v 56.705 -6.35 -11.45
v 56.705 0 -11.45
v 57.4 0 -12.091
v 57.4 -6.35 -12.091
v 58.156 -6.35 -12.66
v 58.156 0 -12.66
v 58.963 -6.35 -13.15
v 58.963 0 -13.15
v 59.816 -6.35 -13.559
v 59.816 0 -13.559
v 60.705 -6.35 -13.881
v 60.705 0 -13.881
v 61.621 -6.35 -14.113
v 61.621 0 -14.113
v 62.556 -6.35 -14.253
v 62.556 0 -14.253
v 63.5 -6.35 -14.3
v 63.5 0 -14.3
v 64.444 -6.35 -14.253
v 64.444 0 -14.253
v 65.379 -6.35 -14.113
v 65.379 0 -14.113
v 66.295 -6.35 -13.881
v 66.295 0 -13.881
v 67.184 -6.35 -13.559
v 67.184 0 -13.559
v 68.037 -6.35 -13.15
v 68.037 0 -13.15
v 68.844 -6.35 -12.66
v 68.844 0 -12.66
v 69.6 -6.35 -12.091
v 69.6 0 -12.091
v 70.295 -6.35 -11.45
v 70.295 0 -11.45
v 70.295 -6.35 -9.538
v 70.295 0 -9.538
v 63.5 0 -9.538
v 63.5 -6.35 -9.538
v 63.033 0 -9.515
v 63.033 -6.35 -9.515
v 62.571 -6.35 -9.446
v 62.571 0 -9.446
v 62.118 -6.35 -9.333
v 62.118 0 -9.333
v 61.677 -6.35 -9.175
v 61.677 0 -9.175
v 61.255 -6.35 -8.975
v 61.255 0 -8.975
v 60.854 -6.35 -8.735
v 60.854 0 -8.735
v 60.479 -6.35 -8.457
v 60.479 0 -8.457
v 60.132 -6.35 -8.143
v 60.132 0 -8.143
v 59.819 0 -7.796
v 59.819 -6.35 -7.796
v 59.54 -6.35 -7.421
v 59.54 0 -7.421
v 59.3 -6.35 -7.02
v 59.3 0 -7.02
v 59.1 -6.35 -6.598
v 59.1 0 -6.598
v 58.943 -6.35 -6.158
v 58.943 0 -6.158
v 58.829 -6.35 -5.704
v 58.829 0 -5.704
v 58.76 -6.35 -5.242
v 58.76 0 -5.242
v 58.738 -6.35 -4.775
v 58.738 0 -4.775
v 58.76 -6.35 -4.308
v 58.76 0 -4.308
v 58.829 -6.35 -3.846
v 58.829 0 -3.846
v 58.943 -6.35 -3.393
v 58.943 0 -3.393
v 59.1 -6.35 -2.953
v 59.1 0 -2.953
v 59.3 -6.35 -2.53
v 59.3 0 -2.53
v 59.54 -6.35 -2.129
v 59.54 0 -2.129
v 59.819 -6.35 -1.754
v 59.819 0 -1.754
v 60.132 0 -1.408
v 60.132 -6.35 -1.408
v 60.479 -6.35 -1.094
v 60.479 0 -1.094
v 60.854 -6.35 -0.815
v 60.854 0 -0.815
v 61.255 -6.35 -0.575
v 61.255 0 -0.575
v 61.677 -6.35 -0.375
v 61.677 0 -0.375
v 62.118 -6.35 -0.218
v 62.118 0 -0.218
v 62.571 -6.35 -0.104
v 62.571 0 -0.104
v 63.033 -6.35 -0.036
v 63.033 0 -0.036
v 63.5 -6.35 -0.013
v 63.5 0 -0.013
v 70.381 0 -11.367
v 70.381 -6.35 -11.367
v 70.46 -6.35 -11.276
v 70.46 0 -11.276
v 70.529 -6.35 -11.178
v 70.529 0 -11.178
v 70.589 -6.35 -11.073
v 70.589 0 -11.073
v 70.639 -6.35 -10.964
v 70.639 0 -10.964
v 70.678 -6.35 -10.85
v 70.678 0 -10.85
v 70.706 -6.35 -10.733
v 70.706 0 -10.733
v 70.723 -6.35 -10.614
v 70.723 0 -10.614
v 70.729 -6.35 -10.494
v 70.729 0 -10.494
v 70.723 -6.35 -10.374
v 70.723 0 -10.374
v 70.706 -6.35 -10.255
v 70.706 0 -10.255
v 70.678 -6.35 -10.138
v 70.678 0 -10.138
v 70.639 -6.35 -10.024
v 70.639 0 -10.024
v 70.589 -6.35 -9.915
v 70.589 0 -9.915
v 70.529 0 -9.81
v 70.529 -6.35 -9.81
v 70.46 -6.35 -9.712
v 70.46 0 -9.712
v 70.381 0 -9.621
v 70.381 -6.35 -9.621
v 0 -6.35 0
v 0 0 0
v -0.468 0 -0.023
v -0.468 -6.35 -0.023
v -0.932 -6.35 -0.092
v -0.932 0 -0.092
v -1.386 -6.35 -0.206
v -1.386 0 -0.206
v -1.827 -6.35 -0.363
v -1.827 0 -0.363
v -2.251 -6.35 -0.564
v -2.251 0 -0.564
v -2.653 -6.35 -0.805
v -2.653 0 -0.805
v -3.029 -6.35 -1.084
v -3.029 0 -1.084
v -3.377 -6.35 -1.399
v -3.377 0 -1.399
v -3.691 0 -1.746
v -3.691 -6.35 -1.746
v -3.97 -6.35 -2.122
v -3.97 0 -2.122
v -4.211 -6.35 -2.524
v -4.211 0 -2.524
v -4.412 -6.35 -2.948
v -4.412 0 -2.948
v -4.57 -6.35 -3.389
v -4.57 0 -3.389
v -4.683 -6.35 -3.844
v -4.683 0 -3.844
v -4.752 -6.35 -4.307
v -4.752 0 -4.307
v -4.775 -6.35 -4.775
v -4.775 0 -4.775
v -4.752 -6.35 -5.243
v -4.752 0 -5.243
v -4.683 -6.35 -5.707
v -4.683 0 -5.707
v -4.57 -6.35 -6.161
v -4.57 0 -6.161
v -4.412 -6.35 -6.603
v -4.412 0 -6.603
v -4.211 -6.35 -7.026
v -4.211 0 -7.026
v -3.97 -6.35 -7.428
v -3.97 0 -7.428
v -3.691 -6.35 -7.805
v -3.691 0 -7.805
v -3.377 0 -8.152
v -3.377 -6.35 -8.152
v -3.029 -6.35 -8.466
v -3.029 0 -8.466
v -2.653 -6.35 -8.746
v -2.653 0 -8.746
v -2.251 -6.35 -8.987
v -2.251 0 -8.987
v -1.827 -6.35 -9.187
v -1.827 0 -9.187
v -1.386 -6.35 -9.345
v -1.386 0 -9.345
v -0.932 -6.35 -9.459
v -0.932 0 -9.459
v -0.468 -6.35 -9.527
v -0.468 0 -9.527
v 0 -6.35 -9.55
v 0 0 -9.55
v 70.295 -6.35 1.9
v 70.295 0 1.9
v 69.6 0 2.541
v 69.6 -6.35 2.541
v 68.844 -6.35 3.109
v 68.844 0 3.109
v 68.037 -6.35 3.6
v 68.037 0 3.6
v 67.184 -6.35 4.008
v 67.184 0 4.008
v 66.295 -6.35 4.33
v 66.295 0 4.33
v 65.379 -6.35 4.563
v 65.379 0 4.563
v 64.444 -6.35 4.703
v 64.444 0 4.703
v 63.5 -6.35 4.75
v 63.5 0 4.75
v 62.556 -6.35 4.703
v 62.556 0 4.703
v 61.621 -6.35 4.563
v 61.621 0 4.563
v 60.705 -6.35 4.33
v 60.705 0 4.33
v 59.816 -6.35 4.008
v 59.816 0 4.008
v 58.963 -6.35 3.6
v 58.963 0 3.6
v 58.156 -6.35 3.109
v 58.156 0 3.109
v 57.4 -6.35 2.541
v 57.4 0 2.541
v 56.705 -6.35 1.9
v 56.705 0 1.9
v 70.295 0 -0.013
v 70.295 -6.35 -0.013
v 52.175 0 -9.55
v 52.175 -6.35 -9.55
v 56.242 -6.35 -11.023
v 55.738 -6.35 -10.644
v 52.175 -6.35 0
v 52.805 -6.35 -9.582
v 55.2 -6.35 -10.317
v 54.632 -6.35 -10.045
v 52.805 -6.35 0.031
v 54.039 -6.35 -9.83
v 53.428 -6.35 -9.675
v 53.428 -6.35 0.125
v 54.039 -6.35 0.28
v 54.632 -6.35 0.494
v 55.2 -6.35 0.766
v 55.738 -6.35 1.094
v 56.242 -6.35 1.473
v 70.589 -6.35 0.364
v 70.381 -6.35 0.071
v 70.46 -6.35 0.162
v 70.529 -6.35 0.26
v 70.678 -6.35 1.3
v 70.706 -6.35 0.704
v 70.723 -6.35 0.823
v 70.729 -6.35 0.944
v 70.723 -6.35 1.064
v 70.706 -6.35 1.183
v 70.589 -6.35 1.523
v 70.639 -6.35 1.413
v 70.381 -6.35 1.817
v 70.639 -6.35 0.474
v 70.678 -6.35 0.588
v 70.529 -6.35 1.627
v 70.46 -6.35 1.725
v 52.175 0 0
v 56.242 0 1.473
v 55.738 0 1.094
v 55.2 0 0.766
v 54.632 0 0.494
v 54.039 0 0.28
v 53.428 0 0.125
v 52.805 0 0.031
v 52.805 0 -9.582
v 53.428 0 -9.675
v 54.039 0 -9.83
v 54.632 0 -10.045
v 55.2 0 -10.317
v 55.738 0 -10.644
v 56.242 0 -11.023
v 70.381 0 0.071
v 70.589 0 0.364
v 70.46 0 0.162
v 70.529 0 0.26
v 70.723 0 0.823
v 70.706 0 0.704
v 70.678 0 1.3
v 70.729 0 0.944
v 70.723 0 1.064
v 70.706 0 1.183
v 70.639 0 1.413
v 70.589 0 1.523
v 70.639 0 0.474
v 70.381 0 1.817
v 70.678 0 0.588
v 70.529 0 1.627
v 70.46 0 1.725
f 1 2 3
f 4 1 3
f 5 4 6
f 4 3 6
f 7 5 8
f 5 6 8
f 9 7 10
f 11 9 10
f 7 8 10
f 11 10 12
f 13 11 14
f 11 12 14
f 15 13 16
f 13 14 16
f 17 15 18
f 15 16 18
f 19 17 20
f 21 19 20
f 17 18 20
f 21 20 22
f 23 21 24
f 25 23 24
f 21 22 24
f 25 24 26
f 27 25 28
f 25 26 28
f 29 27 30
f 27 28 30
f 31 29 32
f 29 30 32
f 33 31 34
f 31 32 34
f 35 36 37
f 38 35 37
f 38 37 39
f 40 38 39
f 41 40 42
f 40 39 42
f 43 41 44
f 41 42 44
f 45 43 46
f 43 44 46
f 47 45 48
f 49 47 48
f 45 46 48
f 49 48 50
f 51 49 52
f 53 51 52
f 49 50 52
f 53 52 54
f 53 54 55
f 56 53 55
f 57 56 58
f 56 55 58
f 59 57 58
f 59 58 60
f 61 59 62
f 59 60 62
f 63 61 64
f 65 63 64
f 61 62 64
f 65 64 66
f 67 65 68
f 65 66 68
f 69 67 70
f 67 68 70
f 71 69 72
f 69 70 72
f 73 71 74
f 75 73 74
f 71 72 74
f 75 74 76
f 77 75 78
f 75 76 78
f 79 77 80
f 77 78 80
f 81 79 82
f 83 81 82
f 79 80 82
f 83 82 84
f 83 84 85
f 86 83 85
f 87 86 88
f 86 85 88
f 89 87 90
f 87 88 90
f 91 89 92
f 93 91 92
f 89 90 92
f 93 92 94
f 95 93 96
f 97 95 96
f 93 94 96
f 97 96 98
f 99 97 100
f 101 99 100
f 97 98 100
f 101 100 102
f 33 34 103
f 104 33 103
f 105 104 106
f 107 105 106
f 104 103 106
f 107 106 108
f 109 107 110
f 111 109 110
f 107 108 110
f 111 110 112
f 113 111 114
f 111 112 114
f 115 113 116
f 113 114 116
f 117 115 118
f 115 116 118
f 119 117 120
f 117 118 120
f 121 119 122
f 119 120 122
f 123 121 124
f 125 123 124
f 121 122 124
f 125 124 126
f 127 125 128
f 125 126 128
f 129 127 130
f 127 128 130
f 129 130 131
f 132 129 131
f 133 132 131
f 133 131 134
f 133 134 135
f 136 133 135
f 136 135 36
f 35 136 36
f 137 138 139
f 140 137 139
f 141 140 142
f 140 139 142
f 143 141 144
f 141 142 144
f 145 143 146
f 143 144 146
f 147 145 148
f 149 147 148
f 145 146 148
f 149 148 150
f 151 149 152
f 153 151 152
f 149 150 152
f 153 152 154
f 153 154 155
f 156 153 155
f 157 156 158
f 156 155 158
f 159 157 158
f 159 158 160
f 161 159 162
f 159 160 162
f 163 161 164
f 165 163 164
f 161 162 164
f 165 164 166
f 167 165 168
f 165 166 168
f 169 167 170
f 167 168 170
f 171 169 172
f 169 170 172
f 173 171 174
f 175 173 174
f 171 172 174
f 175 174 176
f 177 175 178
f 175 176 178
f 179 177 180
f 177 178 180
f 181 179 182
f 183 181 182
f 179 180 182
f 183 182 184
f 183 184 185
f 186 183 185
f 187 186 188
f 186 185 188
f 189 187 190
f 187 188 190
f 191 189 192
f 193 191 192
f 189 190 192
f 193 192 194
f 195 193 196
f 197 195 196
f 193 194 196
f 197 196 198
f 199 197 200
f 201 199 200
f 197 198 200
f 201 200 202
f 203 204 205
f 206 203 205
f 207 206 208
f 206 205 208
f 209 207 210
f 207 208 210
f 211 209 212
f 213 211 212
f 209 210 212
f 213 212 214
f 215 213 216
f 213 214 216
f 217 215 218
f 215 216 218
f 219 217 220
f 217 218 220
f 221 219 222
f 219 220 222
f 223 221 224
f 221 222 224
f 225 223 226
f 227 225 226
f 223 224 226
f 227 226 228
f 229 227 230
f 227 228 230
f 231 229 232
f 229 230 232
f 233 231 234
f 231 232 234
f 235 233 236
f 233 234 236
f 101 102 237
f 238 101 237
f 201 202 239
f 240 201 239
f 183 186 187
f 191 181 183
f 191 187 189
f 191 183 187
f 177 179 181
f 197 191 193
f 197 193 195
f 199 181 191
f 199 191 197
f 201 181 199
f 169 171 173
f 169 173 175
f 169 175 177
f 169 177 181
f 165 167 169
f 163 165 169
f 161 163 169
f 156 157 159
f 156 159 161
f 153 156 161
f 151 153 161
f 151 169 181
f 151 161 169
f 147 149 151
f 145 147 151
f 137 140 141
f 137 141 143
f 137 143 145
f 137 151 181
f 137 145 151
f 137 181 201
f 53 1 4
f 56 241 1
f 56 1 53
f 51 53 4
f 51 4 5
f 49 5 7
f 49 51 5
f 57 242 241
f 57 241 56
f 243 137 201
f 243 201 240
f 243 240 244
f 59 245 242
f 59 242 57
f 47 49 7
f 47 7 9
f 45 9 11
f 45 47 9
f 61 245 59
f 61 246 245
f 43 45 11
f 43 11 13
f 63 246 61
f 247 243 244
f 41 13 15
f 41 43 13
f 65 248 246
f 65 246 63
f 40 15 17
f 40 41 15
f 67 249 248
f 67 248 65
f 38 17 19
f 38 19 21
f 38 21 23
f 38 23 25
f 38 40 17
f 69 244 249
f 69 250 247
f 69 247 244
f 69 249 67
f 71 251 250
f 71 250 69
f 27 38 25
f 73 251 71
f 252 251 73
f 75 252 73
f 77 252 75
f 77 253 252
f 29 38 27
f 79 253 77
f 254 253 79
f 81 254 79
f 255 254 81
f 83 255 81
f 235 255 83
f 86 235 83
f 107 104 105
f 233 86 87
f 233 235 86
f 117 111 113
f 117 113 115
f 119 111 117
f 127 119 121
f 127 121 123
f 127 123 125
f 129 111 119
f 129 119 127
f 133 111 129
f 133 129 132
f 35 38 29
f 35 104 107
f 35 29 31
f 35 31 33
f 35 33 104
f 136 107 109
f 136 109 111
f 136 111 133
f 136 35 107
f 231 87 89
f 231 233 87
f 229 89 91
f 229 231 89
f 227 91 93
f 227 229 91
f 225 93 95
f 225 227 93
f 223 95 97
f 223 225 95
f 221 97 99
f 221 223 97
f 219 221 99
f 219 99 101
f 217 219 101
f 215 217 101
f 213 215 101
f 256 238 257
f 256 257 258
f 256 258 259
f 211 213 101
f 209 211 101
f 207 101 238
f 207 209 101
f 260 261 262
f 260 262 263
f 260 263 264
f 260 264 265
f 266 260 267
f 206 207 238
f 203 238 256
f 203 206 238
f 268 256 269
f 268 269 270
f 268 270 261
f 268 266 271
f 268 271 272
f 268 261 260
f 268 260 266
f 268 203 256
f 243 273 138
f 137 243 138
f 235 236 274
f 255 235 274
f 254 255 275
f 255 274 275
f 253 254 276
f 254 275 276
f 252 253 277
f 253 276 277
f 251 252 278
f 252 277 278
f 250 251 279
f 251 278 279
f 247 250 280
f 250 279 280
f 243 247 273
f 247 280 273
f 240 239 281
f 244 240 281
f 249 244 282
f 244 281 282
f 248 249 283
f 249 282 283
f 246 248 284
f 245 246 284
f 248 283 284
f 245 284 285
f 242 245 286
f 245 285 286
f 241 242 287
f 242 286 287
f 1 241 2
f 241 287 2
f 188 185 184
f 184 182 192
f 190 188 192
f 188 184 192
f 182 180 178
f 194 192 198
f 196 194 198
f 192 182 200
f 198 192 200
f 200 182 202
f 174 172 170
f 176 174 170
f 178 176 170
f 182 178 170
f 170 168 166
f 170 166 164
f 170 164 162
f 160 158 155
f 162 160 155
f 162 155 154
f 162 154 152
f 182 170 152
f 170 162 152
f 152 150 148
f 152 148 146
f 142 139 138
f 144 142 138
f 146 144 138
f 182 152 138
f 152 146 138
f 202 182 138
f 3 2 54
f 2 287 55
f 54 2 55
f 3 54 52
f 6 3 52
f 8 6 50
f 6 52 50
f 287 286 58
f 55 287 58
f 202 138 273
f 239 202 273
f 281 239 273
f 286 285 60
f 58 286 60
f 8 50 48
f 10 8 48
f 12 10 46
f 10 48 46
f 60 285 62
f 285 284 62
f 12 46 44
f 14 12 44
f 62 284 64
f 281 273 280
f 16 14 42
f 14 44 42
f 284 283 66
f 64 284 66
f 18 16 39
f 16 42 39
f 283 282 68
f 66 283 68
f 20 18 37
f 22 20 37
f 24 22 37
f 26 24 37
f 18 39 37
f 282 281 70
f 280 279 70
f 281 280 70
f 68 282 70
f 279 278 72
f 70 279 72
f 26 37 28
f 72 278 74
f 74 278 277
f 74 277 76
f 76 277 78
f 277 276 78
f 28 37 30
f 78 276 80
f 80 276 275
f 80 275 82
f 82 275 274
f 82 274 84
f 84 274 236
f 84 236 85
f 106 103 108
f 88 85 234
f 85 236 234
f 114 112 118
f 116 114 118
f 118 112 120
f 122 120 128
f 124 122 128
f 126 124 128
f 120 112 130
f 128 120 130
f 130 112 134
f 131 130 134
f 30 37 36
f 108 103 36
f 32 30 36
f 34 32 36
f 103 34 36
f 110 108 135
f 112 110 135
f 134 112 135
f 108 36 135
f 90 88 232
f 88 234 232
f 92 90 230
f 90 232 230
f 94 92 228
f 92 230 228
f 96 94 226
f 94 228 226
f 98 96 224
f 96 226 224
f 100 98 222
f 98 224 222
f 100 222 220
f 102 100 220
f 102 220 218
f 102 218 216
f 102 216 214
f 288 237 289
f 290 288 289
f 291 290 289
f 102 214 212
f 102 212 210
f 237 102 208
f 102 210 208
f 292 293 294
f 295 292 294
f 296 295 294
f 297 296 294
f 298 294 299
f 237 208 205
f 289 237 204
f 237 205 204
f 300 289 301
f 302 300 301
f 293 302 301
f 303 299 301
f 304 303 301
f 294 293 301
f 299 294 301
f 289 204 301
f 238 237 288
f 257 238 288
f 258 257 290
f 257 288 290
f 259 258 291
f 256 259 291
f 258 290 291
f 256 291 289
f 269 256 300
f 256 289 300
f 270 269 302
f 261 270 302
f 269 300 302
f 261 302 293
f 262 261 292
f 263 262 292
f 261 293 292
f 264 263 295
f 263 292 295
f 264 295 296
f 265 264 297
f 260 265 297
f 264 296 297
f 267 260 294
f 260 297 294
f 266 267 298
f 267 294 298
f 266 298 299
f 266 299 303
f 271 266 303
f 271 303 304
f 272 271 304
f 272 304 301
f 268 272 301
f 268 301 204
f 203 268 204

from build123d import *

# Parameters (mm, degrees)
F1_DEPTH = 6.35


with BuildPart() as f1:
    # F0 (on Front) → F1 (new body)
    with BuildSketch(Plane.XZ):
        with BuildLine():
            Line((52.175445, 0), (0, 0))
            ThreePointArc((0, 0), (-4.7752, -4.7752), (0, -9.5504))
            Line((0, -9.5504), (52.175445, -9.5504))
            ThreePointArc((52.175445, -9.5504), (54.631508, -10.044612), (56.705267, -11.45032))
            ThreePointArc((56.705267, -11.45032), (63.5, -14.3002), (70.294733, -11.45032))
            ThreePointArc((70.294733, -11.45032), (70.729047, -10.49401), (70.294733, -9.5377))
            Line((70.294733, -9.5377), (63.5, -9.5377))
            ThreePointArc((63.5, -9.5377), (58.7375, -4.7752), (63.5, -0.0127))
            Line((63.5, -0.0127), (70.294733, -0.0127))
            ThreePointArc((70.294733, -0.0127), (70.729047, 0.94361), (70.294733, 1.89992))
            ThreePointArc((70.294733, 1.89992), (63.5, 4.7498), (56.705267, 1.89992))
            ThreePointArc((56.705267, 1.89992), (54.631508, 0.494212), (52.175445, 0))
        make_face()
    extrude(amount=F1_DEPTH)


solid = f1.part
